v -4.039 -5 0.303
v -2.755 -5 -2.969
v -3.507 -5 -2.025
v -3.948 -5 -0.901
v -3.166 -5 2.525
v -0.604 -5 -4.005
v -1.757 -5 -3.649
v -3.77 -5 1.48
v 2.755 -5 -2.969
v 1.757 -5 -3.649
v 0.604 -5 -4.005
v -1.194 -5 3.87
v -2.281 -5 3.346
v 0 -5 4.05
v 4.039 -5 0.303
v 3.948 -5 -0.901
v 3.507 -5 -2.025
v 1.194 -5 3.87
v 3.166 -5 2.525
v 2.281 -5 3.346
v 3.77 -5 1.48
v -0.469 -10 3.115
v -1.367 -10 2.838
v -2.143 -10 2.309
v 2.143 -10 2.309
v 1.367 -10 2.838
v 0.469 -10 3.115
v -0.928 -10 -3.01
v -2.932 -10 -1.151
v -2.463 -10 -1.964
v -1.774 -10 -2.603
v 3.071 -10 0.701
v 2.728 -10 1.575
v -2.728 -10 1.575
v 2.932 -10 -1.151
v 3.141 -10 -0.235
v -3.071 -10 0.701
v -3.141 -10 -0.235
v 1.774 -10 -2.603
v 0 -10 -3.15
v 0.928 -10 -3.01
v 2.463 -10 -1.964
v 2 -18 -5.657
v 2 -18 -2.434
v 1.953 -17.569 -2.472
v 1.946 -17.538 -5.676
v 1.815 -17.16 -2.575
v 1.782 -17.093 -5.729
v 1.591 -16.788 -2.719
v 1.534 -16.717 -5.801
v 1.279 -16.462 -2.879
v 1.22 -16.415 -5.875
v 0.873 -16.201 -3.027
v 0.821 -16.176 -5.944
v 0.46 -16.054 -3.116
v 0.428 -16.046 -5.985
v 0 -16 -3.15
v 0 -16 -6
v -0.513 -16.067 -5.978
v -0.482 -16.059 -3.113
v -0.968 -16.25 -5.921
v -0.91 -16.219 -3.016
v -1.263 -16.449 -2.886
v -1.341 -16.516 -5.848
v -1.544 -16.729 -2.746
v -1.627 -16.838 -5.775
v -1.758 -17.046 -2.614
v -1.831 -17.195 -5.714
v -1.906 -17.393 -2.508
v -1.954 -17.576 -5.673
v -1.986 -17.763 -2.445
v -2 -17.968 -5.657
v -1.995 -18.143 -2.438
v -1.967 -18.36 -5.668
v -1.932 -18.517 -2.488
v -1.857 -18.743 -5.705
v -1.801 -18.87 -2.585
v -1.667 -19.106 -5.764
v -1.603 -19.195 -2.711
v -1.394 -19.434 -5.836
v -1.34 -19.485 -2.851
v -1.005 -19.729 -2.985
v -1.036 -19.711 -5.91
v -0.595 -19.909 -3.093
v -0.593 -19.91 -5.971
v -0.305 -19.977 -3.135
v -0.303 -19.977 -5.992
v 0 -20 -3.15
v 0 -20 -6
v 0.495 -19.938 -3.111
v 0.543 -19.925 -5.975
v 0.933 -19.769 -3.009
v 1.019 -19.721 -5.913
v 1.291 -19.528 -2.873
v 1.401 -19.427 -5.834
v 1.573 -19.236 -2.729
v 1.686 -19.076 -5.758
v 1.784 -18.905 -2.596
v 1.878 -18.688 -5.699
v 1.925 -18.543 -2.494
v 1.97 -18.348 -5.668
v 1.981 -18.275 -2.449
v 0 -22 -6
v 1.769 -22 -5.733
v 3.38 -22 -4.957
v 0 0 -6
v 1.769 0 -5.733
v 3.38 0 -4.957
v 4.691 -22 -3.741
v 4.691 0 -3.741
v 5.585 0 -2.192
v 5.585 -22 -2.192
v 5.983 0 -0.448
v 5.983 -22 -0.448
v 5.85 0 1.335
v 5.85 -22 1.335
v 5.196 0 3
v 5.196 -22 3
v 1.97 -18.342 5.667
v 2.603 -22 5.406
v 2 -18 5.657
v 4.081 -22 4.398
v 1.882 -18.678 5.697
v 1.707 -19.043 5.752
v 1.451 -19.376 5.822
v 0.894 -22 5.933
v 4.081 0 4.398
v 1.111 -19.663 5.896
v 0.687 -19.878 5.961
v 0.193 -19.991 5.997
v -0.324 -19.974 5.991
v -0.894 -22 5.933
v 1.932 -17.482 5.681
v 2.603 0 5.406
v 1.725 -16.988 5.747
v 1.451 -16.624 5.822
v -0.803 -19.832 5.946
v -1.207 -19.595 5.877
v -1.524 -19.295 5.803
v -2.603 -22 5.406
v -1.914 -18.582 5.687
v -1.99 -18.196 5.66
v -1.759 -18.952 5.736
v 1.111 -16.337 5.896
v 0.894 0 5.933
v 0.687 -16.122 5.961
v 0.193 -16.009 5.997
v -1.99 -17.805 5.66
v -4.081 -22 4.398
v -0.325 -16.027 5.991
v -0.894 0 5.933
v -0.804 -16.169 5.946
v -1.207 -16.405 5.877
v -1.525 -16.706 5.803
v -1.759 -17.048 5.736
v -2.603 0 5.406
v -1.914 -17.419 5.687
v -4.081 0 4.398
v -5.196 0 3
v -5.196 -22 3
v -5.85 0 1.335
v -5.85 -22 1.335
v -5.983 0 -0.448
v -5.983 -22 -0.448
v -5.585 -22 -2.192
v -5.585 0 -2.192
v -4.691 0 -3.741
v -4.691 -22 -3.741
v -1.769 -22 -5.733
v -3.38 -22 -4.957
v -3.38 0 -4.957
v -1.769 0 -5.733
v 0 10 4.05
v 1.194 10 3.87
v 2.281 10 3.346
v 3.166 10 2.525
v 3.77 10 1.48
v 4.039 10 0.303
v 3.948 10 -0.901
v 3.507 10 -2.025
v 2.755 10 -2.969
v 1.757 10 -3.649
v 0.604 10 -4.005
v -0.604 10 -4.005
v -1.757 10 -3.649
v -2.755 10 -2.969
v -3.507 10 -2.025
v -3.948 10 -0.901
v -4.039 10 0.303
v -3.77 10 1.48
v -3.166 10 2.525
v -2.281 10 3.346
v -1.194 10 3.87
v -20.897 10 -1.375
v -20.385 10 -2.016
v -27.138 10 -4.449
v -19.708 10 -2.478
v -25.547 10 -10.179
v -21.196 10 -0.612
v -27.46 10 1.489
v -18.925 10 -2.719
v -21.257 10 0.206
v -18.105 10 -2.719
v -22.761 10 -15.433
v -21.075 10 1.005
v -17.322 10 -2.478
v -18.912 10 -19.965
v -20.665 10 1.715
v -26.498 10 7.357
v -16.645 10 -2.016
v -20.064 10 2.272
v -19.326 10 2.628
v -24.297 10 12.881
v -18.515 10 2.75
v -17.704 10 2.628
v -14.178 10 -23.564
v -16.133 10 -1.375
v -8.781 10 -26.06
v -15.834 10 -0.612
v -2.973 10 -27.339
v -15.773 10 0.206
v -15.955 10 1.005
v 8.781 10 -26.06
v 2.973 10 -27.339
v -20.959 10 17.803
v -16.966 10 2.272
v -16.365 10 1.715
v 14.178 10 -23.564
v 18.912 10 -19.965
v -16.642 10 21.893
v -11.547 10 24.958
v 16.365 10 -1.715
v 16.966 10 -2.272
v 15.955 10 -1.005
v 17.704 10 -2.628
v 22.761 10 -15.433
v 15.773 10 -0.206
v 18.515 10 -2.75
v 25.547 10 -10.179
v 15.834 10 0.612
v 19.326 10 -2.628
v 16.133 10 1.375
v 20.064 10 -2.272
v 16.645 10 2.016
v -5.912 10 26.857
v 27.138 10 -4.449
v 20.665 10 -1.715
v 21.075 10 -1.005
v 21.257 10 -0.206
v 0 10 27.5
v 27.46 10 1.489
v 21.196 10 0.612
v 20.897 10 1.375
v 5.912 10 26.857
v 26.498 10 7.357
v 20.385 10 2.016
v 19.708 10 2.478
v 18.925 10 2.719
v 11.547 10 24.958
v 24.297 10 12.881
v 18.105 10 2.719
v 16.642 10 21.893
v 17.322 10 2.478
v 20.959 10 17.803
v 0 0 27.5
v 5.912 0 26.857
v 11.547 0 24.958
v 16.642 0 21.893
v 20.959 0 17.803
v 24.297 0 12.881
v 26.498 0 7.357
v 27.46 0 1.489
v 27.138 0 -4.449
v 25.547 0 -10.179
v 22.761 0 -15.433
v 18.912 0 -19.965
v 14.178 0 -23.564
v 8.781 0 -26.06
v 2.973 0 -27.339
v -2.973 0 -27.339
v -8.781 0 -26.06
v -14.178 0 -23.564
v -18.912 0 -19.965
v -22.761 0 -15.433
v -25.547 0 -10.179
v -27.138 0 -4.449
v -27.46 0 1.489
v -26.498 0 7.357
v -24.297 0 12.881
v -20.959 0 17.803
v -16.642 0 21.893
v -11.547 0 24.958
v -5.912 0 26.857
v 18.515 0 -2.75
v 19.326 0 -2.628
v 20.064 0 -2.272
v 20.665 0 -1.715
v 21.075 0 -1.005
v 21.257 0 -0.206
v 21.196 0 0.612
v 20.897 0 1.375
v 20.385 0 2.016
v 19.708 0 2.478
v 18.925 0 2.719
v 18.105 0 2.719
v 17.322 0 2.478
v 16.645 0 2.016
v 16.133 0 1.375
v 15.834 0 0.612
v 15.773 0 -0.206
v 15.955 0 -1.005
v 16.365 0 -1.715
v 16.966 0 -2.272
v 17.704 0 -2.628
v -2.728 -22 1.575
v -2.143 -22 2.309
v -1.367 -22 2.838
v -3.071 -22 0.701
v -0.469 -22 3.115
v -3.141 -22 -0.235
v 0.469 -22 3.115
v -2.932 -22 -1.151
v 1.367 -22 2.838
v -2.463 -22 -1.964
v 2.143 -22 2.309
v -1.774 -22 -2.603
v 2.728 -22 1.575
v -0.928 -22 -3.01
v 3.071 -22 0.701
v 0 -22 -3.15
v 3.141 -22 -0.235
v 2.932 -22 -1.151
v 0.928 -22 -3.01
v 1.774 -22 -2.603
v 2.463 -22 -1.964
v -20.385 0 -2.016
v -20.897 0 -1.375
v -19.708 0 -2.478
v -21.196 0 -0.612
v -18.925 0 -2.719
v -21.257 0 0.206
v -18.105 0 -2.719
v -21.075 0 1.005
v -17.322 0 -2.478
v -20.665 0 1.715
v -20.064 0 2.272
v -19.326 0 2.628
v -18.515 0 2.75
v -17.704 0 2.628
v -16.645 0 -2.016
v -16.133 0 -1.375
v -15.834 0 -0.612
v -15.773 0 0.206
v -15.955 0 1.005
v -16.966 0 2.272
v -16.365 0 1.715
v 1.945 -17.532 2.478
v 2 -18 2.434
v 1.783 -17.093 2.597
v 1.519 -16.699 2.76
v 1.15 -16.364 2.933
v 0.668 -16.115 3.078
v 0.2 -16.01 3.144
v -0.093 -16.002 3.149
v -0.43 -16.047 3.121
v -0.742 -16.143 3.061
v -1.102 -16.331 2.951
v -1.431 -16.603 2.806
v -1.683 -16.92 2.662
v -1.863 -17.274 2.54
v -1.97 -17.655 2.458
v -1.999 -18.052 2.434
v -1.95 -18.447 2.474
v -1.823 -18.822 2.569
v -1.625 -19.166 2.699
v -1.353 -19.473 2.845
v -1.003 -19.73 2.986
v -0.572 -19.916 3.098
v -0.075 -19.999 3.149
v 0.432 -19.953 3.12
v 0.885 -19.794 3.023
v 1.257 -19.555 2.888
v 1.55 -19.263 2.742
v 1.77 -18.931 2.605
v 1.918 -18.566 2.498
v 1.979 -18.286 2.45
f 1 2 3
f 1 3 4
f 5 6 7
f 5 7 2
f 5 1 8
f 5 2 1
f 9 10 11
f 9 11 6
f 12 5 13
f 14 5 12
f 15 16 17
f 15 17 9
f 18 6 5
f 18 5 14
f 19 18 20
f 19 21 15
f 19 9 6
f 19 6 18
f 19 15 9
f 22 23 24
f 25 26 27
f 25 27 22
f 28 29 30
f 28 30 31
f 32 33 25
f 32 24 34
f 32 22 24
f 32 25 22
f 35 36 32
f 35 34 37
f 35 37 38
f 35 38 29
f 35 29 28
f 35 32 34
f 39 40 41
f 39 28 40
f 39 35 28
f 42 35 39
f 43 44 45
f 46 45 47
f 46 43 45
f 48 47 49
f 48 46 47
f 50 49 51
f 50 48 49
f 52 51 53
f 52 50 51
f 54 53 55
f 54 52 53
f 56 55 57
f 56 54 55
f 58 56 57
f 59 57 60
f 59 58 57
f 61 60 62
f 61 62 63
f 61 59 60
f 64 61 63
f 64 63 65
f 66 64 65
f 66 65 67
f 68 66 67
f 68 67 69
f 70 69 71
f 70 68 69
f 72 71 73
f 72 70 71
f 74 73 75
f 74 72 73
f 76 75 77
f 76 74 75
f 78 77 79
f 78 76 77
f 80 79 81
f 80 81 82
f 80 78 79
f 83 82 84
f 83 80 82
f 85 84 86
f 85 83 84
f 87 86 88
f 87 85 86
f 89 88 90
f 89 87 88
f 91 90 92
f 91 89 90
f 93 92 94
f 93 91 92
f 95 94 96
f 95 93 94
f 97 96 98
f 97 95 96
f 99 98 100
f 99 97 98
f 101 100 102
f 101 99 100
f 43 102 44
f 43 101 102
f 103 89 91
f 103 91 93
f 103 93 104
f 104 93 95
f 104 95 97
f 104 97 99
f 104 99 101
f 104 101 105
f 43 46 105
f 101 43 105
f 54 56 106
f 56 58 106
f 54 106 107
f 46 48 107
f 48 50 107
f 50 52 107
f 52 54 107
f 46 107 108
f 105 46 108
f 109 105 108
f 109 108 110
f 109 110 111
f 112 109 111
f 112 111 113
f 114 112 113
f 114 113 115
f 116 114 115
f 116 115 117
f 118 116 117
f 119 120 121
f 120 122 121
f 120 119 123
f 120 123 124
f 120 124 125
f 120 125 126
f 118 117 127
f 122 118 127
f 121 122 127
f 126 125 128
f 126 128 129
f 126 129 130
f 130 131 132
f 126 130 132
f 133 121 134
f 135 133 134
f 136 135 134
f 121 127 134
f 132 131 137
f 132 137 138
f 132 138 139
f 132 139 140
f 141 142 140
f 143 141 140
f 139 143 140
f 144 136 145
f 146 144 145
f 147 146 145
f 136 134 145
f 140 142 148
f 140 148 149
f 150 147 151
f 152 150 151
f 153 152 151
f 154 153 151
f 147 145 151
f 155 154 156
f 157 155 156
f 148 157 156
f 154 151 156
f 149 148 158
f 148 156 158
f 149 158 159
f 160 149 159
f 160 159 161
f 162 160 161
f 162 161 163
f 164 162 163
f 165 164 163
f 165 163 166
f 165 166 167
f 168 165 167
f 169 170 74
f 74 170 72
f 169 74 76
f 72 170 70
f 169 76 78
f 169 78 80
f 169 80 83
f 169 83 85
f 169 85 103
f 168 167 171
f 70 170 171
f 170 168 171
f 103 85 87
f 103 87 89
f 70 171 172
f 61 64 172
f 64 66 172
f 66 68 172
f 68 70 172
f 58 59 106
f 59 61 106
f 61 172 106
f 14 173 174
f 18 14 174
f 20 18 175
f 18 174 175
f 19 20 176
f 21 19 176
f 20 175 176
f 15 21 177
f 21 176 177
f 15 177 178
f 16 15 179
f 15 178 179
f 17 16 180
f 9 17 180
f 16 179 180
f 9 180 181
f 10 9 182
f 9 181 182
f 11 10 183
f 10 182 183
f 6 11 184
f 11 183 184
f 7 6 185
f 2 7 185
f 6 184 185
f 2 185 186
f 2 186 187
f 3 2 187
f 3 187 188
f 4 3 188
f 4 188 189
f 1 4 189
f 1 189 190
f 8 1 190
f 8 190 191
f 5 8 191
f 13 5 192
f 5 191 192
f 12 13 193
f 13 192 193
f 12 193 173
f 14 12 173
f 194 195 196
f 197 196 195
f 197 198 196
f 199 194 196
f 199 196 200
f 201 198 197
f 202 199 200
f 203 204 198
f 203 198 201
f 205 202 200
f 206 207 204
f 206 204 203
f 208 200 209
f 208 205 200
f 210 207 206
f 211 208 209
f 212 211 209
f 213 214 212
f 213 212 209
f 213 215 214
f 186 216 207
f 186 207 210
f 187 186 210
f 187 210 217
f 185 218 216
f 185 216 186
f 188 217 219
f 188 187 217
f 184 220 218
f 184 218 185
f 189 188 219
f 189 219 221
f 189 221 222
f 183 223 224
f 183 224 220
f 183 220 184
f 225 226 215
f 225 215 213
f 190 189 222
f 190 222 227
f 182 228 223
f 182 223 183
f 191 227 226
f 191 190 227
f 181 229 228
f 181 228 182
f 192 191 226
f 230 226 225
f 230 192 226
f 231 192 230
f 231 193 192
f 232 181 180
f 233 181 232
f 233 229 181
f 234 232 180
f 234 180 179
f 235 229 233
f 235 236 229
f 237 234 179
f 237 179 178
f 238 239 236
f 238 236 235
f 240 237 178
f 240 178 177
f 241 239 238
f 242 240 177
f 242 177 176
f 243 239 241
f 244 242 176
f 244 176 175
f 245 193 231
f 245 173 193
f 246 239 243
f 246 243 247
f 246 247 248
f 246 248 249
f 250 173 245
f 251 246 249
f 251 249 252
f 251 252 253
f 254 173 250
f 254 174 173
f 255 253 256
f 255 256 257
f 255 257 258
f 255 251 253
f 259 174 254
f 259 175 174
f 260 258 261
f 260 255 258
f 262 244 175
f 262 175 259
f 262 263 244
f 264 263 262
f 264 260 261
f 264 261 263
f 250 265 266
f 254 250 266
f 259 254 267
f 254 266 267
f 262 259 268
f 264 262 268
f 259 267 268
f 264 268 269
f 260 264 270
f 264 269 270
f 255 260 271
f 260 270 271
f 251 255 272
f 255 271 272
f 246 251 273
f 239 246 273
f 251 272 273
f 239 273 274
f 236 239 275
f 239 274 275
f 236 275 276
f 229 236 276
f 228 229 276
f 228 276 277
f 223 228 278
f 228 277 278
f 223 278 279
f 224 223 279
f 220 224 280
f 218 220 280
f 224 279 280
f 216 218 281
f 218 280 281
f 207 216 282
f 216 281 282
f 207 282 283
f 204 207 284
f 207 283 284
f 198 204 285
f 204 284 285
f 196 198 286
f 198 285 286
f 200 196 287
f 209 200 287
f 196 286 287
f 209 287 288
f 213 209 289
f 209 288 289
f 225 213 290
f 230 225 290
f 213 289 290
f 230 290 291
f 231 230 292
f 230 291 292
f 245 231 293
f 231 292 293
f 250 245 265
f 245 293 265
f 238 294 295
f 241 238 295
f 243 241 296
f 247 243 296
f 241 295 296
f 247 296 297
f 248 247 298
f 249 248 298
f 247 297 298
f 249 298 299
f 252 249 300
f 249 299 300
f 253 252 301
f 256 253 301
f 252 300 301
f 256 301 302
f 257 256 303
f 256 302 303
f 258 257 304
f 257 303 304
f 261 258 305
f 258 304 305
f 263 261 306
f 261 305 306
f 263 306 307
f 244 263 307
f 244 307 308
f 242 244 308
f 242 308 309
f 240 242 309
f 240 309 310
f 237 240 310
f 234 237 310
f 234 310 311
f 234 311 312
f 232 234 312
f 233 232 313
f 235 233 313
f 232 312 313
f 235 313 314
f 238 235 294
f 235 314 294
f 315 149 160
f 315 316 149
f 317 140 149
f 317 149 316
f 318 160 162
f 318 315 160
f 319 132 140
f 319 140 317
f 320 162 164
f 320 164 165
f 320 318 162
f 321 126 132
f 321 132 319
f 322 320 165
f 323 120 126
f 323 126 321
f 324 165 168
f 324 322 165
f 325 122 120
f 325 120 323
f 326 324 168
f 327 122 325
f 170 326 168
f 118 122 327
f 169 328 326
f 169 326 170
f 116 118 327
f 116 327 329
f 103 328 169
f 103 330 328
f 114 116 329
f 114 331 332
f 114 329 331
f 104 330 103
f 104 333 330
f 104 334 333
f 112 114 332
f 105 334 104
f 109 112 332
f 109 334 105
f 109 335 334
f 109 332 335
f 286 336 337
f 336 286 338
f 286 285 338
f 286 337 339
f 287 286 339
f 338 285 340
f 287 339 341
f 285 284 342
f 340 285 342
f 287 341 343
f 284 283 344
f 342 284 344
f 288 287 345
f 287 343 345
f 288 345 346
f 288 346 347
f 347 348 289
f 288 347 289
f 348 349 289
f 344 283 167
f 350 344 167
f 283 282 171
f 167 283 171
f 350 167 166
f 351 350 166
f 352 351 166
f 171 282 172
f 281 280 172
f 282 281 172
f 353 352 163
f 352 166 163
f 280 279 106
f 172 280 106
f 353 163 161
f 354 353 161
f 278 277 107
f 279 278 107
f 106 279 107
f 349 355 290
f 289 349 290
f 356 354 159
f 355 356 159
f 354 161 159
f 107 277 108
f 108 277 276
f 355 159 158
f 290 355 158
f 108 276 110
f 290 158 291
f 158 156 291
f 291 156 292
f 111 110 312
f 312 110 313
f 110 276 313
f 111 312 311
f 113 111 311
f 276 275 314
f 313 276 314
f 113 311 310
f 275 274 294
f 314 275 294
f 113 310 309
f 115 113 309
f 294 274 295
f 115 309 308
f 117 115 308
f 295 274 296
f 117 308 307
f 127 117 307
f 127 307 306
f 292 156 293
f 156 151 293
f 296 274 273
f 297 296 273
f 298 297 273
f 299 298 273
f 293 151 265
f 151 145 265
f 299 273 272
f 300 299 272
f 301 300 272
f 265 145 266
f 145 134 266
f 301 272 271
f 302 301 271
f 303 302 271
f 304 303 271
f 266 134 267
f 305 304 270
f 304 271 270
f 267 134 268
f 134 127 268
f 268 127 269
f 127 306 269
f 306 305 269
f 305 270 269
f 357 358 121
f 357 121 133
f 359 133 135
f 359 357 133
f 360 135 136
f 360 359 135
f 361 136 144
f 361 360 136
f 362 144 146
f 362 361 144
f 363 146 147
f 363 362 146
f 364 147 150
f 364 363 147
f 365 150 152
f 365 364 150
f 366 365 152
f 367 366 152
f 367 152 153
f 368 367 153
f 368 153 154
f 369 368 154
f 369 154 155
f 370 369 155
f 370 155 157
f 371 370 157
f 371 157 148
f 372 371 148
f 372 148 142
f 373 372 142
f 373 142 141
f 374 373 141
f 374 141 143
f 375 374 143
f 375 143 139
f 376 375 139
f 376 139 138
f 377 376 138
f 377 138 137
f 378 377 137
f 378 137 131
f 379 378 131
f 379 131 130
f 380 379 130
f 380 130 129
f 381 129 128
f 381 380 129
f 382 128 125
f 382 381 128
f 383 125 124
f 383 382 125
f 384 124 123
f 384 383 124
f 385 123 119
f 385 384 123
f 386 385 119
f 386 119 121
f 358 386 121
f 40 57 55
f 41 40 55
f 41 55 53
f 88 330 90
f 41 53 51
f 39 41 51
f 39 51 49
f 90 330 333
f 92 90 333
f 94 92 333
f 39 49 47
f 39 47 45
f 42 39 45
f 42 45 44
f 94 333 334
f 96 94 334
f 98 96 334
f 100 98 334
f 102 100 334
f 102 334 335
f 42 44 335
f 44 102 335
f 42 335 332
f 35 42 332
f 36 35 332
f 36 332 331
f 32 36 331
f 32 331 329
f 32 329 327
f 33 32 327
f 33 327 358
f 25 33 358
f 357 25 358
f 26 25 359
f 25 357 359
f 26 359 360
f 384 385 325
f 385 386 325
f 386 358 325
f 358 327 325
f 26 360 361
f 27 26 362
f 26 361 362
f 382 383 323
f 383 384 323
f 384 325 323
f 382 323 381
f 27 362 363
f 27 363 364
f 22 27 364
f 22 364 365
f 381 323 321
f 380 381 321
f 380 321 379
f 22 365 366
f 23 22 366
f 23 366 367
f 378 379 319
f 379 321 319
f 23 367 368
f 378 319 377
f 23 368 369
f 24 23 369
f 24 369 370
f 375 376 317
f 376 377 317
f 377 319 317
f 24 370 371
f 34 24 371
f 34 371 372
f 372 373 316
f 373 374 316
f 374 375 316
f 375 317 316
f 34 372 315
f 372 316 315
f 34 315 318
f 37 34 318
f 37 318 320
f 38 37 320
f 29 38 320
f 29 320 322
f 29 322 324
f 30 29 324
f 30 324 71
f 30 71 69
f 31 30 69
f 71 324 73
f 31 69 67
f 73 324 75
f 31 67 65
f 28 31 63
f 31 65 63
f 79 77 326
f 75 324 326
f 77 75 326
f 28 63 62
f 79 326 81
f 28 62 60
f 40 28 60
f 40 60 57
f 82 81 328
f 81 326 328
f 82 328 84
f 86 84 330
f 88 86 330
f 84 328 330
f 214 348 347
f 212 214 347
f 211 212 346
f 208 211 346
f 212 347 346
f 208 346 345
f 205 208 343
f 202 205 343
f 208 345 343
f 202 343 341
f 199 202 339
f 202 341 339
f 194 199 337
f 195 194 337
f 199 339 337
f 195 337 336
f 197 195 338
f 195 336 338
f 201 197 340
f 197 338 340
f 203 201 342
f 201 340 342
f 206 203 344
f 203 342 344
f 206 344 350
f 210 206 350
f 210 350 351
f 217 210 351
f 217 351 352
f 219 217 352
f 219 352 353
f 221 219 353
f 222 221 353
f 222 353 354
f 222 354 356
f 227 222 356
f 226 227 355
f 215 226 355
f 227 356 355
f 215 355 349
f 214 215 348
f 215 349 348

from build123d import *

# Parameters (mm, degrees)
SKETCH_1_R               = 27.5
EXTRUDE_1_DEPTH          = 10
SKETCH_2_R               = 2.75
CUT_EXTRUDE_1_DEPTH      = 10
PATTERN_CIRCULAR_1_COUNT = 2
SKETCH_3_R               = 6
EXTRUDE_2_DEPTH          = 22
SKETCH_5_R               = 3.15
CUT_EXTRUDE_3_DEPTH      = 12
SKETCH_4_R               = 4.05
CUT_EXTRUDE_2_DEPTH      = 15
CUT_EXTRUDE_4_DEPTH      = 45.682211225
CUT_EXTRUDE_4_DEPTH_BACK = 45.682211225
SKETCH_6_R               = 2


with BuildPart() as part:
    # 草图1 → 凸台-拉伸1 (new body)
    with BuildSketch(Plane(origin=(0, 0, 0), x_dir=(1, 0, 0), z_dir=(0, 1, 0))):
        with Locations(Location((0, 0, 0), (0, 0, 270))):
            Circle(SKETCH_1_R)
    extrude(amount=EXTRUDE_1_DEPTH)

    # 草图2 → 切除-拉伸1 (cut)
    with BuildSketch(Plane.XZ):
        with Locations(Location((18.515, 0, 0), (0, 0, 270))):
            Circle(SKETCH_2_R)
    cut_extrude_1 = extrude(amount=-CUT_EXTRUDE_1_DEPTH, mode=Mode.SUBTRACT)

    # 阵列(圆周)1: 切除-拉伸1 ×2 about axis
    pattern_circular_1_axis = Axis((0, 0, 0), (0, 1, 0))
    for i in range(1, PATTERN_CIRCULAR_1_COUNT):
        add(cut_extrude_1.rotate(pattern_circular_1_axis, i * 360 / PATTERN_CIRCULAR_1_COUNT), mode=Mode.SUBTRACT)

    # 草图3 → 凸台-拉伸2 (add)
    with BuildSketch(Plane.XZ):
        with Locations(Location((0, 0, 0), (0, 0, 270))):
            Circle(SKETCH_3_R)
    extrude(amount=EXTRUDE_2_DEPTH)

    # 草图5 → 切除-拉伸3 (cut)
    with BuildSketch(Plane.XZ.offset(22)):
        with Locations(Location((0, 0, 0), (0, 0, 270))):
            Circle(SKETCH_5_R)
    extrude(amount=-CUT_EXTRUDE_3_DEPTH, mode=Mode.SUBTRACT)

    # 草图4 → 切除-拉伸2 (cut)
    with BuildSketch(Plane(origin=(0, 10, 0), x_dir=(1, 0, 0), z_dir=(0, 1, 0))):
        with Locations(Location((0, 0, 0), (0, 0, 270))):
            Circle(SKETCH_4_R)
    extrude(amount=-CUT_EXTRUDE_2_DEPTH, mode=Mode.SUBTRACT)

    # 草图6 → 切除-拉伸4 (cut, two sides: drawn at the far end of the back side and taken through both)
    with BuildSketch(Plane.XY.offset(-CUT_EXTRUDE_4_DEPTH_BACK)):
        with Locations((0, -18)):
            Circle(SKETCH_6_R)
    extrude(amount=CUT_EXTRUDE_4_DEPTH + CUT_EXTRUDE_4_DEPTH_BACK, mode=Mode.SUBTRACT)


solid = part.part
